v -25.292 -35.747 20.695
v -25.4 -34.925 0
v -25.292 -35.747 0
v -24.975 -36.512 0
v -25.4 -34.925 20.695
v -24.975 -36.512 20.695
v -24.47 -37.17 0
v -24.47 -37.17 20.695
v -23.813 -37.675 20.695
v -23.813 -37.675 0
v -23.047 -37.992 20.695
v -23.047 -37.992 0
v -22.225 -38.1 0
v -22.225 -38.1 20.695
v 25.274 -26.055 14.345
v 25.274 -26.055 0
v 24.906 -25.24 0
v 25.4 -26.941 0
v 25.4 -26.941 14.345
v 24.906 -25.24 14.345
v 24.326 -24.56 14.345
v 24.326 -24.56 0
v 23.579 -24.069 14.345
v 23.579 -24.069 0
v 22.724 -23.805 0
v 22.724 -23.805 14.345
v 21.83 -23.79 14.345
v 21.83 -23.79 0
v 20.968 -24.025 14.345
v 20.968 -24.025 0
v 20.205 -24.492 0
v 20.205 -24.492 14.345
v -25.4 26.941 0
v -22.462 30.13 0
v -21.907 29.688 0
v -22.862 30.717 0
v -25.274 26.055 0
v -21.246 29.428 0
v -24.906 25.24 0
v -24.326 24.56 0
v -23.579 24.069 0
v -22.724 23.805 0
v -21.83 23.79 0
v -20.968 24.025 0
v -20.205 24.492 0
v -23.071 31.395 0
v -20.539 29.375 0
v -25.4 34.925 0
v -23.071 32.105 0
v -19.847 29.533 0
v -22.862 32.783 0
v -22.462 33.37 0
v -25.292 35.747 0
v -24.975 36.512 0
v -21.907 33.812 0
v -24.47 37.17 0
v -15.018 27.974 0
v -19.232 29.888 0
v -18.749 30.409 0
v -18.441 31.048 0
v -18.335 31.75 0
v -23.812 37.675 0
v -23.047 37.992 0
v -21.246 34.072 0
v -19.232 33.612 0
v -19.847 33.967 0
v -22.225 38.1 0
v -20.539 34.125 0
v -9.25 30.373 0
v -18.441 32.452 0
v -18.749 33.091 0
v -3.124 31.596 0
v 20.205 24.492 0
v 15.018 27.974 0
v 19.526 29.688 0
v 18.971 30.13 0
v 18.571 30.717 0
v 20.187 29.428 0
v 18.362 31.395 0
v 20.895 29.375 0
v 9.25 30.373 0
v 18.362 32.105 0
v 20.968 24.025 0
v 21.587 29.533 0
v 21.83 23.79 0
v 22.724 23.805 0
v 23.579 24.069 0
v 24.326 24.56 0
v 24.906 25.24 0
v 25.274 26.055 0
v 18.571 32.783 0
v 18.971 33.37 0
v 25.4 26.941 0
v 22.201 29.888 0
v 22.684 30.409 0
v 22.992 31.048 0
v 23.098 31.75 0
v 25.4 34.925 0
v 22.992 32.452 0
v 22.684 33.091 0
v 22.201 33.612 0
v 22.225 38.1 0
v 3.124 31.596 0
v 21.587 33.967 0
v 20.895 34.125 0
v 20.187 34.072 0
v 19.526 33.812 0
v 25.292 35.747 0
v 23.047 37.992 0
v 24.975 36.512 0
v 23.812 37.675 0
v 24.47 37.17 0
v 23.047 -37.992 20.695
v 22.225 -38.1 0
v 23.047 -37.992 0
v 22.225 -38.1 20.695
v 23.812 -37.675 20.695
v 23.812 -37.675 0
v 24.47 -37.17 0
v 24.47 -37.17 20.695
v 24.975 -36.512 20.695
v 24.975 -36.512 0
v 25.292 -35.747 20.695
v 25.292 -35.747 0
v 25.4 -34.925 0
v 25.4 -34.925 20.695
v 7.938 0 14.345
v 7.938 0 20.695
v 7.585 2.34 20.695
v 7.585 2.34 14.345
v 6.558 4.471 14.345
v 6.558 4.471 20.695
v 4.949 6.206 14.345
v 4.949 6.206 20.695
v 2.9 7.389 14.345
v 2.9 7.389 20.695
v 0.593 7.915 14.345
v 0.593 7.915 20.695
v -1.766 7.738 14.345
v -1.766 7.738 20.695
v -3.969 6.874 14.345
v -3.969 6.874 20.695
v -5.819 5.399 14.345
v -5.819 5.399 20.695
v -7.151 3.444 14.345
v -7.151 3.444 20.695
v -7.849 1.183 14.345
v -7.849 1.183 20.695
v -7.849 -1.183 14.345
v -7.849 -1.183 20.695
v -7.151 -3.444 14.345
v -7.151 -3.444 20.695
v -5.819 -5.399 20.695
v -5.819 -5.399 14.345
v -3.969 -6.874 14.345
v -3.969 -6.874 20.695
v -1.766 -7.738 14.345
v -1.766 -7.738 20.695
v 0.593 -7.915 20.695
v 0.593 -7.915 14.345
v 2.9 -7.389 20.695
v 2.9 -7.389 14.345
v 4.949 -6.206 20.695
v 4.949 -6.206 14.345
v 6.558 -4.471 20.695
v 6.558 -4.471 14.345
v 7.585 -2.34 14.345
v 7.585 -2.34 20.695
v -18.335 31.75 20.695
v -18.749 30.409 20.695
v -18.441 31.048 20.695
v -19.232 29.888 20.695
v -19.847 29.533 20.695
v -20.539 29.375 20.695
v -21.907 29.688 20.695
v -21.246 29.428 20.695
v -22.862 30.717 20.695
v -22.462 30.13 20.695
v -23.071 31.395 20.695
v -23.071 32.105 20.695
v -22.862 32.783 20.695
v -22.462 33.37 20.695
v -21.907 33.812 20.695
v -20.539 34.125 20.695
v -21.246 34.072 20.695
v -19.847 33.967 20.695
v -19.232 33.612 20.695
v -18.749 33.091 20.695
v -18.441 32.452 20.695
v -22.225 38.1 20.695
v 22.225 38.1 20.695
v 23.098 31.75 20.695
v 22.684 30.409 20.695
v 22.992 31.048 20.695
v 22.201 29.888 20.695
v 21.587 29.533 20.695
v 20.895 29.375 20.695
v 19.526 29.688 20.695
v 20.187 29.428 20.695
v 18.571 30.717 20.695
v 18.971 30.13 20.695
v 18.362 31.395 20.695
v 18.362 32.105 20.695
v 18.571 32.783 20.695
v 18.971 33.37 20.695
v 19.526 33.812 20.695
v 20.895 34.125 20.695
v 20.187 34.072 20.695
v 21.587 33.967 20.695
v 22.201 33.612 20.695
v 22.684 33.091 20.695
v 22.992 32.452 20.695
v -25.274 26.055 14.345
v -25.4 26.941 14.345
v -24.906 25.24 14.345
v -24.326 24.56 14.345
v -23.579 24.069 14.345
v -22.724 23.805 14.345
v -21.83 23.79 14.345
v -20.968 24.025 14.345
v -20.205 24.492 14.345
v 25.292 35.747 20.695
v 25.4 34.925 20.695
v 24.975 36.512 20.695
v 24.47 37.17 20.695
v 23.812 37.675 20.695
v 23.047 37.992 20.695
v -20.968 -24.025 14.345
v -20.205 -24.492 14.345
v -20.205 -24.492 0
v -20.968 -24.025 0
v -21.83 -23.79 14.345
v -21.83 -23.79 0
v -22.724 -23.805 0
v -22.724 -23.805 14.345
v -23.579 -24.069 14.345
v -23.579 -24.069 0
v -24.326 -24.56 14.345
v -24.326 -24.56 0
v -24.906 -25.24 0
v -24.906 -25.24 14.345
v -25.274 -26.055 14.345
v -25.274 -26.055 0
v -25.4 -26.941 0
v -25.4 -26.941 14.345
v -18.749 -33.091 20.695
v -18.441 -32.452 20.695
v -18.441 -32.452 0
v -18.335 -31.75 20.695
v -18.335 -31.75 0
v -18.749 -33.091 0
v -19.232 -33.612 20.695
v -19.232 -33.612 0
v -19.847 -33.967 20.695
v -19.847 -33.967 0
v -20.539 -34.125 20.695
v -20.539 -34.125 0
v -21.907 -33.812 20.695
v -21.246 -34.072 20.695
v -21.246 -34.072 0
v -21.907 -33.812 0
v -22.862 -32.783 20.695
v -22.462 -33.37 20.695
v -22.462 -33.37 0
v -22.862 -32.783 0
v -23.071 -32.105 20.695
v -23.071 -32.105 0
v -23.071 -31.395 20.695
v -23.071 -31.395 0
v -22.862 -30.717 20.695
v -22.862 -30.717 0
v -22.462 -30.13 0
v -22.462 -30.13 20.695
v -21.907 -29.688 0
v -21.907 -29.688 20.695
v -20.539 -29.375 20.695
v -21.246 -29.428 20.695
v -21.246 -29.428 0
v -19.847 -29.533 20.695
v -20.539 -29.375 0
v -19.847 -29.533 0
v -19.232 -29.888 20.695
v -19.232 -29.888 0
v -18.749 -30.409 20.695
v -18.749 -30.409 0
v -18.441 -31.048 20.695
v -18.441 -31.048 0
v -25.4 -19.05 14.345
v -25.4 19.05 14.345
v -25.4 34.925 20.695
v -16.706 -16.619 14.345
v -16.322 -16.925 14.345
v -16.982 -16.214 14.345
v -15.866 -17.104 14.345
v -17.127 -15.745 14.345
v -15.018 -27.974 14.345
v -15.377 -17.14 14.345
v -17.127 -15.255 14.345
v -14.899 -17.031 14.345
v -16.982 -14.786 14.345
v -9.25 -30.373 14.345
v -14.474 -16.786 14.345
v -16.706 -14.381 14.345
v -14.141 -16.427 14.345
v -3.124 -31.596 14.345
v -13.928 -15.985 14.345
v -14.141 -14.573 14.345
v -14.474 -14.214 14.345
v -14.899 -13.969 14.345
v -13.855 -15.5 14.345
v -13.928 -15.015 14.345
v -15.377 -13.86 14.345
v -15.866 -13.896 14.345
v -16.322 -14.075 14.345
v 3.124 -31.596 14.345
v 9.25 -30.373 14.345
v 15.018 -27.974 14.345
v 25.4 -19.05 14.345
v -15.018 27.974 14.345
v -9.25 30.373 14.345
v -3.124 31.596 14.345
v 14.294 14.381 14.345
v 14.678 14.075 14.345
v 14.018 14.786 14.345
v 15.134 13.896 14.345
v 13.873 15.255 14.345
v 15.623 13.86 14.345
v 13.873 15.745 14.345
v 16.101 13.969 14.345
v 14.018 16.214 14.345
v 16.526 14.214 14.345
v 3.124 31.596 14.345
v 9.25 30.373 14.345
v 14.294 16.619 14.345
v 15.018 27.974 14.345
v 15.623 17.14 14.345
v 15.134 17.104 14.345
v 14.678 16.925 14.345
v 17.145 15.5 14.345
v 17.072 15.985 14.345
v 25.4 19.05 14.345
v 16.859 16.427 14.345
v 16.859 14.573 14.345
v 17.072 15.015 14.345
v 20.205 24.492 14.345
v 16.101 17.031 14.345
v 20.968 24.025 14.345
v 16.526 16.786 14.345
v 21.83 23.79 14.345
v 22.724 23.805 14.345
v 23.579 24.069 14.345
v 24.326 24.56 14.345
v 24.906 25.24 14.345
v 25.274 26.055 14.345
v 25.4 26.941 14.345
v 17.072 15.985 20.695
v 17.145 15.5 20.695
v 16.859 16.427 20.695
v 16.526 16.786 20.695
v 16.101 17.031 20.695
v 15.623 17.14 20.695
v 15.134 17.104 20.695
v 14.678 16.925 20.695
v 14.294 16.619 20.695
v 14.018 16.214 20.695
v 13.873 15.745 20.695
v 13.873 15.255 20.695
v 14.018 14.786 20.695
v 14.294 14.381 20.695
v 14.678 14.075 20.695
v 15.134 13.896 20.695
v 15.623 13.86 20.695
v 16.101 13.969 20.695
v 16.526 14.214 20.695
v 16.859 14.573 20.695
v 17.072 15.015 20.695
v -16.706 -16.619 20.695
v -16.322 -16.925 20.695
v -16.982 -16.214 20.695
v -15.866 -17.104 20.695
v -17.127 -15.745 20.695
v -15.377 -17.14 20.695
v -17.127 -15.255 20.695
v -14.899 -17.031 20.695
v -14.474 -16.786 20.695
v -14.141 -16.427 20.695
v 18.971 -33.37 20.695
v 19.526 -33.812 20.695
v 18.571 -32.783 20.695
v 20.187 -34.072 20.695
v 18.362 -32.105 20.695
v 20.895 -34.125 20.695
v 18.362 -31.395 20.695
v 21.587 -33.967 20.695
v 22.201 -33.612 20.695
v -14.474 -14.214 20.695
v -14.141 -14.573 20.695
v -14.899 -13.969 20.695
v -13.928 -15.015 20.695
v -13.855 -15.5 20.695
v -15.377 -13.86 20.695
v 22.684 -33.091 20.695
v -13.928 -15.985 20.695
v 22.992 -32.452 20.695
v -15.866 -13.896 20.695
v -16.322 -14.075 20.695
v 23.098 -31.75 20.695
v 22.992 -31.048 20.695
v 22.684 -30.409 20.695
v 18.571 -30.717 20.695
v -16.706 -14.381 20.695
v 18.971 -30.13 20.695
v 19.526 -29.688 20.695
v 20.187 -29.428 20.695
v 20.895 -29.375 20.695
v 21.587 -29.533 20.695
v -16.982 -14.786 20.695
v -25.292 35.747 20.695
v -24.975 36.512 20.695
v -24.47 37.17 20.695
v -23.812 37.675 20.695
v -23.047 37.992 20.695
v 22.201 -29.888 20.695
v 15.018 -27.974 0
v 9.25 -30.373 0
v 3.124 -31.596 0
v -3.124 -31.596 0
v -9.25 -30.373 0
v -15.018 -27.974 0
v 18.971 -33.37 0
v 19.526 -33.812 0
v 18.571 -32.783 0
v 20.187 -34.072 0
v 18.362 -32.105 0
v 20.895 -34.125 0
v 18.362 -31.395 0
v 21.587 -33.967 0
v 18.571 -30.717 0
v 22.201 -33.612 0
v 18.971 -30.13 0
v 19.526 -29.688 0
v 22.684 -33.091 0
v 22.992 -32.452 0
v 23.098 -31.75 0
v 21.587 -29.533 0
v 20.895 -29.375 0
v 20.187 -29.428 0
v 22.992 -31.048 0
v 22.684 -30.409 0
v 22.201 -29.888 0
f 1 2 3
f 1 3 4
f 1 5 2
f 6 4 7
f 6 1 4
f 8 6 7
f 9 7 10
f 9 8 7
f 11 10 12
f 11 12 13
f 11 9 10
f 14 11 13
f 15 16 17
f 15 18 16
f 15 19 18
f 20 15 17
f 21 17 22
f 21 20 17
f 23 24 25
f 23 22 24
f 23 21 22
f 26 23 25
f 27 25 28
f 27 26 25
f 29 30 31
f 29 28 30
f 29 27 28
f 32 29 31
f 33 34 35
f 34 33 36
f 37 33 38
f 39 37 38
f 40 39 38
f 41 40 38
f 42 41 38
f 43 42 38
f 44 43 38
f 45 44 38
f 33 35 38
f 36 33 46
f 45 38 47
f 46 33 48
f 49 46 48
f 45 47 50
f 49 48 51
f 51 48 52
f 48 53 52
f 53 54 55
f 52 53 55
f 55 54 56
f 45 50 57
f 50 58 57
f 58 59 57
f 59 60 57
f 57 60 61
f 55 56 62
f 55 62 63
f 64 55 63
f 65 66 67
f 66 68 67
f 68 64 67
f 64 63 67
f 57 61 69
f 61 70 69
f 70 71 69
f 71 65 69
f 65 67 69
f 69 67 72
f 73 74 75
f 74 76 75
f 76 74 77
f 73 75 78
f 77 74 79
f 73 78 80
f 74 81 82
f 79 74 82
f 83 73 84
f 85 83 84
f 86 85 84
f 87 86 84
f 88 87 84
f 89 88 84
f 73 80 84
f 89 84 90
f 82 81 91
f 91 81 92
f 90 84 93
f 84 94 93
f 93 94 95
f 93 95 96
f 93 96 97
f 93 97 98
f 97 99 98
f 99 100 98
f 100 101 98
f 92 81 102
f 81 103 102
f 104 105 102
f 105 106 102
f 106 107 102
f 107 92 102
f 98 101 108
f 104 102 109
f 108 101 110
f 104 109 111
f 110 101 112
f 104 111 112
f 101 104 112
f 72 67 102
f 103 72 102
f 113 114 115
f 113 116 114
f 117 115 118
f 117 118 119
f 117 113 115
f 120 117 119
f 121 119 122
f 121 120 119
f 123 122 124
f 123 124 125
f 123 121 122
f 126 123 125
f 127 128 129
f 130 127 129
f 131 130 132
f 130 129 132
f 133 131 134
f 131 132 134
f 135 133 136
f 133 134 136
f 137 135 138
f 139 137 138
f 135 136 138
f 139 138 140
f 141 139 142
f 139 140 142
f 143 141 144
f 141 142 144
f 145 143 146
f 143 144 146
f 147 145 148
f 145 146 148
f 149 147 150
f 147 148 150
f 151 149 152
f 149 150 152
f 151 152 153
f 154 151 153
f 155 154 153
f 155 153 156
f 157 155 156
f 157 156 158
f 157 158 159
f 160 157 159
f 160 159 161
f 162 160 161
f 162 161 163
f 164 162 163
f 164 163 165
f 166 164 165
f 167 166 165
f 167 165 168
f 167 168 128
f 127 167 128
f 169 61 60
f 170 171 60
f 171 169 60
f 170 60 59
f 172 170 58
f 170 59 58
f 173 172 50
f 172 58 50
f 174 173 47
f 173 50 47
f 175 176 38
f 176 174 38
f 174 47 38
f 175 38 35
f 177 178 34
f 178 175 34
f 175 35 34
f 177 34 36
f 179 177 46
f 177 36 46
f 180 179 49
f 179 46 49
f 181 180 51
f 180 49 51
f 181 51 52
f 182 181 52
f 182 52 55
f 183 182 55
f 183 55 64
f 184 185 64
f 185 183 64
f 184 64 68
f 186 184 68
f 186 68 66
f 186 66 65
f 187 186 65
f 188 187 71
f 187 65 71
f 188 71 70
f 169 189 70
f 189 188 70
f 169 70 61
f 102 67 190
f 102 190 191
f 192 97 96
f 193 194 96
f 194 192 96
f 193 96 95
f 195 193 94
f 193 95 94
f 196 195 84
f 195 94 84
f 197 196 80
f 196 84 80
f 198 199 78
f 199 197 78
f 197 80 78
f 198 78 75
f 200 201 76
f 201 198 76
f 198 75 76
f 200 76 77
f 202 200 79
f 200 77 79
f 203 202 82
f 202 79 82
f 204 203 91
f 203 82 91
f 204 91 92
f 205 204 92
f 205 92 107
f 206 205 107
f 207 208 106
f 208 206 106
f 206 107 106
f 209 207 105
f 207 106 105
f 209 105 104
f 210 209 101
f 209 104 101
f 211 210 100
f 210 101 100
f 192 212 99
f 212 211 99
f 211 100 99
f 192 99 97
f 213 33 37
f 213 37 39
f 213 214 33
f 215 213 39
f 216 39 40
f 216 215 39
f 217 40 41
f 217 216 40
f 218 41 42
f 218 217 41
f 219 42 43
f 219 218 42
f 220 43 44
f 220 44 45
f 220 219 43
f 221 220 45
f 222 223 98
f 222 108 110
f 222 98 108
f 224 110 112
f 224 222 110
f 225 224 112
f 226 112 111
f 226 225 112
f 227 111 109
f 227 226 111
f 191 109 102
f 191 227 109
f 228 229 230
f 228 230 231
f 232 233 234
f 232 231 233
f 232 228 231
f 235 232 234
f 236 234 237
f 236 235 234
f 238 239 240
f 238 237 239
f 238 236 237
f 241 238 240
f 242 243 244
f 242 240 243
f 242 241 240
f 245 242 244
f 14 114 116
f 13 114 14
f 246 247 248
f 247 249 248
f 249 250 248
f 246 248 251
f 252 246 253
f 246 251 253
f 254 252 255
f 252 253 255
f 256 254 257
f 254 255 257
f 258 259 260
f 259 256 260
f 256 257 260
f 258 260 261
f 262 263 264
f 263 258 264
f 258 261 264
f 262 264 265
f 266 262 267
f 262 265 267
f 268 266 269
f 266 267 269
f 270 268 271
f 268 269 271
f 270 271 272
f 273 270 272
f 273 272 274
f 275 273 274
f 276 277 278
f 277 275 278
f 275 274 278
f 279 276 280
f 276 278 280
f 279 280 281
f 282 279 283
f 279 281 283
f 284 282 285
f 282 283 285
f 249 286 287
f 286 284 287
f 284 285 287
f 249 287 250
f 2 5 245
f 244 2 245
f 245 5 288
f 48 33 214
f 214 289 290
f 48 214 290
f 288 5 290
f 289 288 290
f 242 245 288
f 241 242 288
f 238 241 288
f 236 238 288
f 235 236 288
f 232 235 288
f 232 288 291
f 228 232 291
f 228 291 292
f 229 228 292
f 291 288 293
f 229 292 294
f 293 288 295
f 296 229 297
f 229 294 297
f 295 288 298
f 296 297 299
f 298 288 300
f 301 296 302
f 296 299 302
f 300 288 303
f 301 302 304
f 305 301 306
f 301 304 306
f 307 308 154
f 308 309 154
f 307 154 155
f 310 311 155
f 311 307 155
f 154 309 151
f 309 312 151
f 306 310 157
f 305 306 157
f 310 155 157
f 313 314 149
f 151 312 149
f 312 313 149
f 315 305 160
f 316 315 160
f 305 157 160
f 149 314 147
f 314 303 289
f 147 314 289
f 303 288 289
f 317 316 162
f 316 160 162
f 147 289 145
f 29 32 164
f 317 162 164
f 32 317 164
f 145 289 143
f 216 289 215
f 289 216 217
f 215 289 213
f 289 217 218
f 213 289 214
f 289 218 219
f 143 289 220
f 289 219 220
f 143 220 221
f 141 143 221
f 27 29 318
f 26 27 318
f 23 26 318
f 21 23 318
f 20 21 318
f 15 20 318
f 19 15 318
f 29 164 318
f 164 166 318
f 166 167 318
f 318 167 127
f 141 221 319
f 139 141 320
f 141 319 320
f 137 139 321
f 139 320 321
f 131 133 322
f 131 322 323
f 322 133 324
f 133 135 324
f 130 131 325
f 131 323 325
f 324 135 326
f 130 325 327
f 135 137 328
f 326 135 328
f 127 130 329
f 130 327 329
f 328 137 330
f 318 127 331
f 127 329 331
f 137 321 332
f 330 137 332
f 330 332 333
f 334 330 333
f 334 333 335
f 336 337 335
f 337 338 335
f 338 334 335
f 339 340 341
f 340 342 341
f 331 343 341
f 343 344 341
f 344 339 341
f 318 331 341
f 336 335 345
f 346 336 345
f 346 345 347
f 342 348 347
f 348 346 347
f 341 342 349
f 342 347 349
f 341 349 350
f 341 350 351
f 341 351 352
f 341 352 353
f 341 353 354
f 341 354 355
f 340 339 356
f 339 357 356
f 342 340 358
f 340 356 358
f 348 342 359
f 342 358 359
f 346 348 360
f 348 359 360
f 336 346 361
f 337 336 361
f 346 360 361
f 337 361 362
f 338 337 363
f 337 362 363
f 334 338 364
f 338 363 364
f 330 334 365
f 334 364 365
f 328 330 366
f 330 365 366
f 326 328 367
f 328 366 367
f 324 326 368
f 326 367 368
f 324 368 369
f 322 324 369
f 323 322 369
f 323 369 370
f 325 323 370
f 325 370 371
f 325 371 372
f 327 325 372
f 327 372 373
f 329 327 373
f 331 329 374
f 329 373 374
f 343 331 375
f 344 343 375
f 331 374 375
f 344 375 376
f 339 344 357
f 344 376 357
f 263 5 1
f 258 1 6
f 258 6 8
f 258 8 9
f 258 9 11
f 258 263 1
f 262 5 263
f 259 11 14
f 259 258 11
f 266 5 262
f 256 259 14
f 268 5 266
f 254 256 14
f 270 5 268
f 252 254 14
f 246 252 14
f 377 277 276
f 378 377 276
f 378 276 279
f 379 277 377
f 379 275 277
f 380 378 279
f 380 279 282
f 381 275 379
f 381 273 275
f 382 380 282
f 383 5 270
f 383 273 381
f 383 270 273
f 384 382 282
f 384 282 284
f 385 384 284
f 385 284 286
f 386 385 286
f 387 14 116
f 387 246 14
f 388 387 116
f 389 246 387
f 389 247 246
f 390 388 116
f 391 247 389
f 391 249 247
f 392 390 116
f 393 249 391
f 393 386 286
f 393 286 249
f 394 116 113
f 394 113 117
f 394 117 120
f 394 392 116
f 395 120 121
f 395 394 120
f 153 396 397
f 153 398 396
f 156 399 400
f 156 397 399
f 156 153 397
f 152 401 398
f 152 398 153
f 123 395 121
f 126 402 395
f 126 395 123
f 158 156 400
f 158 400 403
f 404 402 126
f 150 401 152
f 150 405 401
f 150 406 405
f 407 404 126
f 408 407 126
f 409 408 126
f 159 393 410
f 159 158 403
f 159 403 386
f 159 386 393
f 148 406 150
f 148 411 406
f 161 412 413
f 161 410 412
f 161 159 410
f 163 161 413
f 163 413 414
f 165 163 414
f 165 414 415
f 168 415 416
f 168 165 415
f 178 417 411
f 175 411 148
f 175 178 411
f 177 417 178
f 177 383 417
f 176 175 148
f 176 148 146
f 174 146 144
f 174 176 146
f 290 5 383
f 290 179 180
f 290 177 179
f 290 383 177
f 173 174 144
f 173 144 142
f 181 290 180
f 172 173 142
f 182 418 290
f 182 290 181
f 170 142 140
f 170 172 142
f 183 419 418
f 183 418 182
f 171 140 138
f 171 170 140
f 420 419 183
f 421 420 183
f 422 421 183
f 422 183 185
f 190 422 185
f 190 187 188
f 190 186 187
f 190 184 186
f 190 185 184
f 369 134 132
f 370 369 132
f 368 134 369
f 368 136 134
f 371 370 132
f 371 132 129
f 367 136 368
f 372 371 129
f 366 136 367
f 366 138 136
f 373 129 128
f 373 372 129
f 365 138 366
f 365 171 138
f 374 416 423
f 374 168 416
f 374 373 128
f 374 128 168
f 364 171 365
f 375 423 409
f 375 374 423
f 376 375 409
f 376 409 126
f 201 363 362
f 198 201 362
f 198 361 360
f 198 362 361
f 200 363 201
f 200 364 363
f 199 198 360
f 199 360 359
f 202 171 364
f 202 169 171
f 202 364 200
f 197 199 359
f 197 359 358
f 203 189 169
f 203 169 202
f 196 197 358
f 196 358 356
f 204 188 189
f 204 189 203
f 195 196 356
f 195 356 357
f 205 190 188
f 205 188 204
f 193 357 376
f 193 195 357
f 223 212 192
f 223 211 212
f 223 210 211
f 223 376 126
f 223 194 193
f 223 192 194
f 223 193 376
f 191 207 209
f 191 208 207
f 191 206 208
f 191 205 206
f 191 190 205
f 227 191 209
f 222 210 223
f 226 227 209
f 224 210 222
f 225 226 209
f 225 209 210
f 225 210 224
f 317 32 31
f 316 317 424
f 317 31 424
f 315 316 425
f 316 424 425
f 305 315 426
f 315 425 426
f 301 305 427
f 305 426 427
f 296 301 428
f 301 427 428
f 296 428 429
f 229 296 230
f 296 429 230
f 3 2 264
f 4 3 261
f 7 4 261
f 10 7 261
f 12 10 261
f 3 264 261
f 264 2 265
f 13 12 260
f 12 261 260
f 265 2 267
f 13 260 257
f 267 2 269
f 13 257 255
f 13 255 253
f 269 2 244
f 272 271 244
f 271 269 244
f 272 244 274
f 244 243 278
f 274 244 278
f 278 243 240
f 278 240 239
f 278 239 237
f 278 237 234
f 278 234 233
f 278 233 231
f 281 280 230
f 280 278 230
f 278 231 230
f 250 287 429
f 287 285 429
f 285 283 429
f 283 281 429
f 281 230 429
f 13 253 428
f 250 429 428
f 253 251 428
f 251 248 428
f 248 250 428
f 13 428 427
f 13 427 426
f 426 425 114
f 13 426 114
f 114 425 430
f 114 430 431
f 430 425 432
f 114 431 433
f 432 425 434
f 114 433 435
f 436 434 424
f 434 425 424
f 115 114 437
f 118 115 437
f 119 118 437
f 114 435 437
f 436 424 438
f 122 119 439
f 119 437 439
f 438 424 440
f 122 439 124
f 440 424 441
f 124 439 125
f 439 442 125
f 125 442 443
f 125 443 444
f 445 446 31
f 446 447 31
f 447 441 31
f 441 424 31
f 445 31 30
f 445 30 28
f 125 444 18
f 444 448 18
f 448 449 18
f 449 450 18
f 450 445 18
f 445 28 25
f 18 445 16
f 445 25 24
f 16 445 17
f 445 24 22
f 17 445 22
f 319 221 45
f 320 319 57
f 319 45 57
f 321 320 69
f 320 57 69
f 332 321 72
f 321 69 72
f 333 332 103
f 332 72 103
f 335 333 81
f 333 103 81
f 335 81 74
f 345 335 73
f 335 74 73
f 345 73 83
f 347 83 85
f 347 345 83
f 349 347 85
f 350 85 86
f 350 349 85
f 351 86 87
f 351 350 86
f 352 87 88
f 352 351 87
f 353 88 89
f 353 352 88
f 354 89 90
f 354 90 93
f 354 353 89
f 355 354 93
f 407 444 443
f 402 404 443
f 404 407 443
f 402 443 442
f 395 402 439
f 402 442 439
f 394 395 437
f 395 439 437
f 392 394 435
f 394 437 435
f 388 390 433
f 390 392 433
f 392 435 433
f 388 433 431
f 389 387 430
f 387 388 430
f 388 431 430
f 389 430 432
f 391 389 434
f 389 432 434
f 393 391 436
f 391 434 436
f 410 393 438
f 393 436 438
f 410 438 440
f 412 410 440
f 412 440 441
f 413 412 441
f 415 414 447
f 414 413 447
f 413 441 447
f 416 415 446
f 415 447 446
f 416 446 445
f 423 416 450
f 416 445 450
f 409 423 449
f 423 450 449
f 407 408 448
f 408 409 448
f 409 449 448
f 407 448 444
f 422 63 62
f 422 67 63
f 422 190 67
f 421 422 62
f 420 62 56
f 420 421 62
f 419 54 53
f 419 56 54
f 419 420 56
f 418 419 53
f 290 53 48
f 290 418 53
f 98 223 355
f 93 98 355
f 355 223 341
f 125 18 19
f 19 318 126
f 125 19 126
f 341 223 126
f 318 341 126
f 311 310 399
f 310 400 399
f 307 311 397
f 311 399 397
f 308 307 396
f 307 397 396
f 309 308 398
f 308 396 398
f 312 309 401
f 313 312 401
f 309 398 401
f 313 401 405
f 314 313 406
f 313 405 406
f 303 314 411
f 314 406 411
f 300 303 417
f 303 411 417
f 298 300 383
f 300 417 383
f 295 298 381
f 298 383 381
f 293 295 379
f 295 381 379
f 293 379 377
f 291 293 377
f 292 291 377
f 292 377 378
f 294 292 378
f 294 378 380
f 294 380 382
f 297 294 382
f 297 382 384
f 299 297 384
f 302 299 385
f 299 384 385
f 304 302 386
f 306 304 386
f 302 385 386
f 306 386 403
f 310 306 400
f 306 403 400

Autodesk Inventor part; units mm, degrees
ref_plane "YZ Plane" through (0, 0, 0) normal (1, 0, 0) x (0, 1, 0)
ref_plane "XZ Plane" through (0, 0, 0) normal (0, 1, 0) x (-1, 0, 0)
sketch "Sketch1" plane through (0, 0, 0) normal (0, 0, 1) x (1, 0, 0)
  circle A0 centre (0, 0) radius 31.75 projected
  line L0 (25.4, 38.1) -> (25.4, -38.1) projected
  circle A1 centre (20.7166, 31.75) radius 2.3813 projected
  line L1 (14.986, 531.4221) -> (14.986, -382.9779) projected
  line L2 (-25.4, 38.1) -> (25.4, 38.1) projected
  circle A2 centre (-20.7166, 31.75) radius 2.3813 projected
  line L3 (-25.4, -38.1) -> (-25.4, 38.1) projected
  circle A3 centre (-20.7166, -31.75) radius 2.3813 projected
  line L4 (25.4, -38.1) -> (-25.4, -38.1) projected
  circle A4 centre (20.7166, -31.75) radius 2.3813 projected
  circle A5 centre (0, 0) radius 31.75 projected
  point P0 (0, 0)
  point P1 (25.4, -19.05)
  point P2 (-25.4, -19.05)
  point P3 (-25.4, 19.05)
  point P4 (25.4, 19.05)
ref_plane "Work Plane1" through (-19.4127, -19.4127, 20.695) normal (0, 0, -1) x (0, 1, 0)
extrude "Extrusion1" add sketch "Sketch1" along normal up to surface (20.695 mm away) contours A0 L1 L2 L0 | L0 L4 L1 A0 | A0 L3 L2 L1 | L1 L4 L3 A0
sketch "Sketch2" plane through (0, 0, 20.695) normal (0, 0, 1) x (1, 0, 0)
  arc A0 (-25.4, -19.05) -> (25.4, -19.05) centre (0, 0) ccw projected
  line L0 (25.4, 38.1) -> (25.4, -38.1) projected
  arc A1 (25.4, 19.05) -> (-25.4, 19.05) centre (0, 0) ccw projected
  line L1 (-25.4, -38.1) -> (-25.4, 38.1) projected
  circle A2 centre (-15.5, -15.5) radius 1.6449 projected
  circle A3 centre (15.5, 15.5) radius 1.6449 projected
  circle A4 centre (0, 0) radius 7.9375
  point P0 (0, 0)
  dimension "d2" = 15.875
extrude "Extrusion2" add sketch "Sketch2" against normal blind 6.35
fillet "Fillet1" radius 3.175 8 edges at (-25.4, -19.05, 7.1725) (-25.4, 19.05, 7.1725) (-25.4, 38.1, 10.3475) (25.4, 38.1, 10.3475) (25.4, -38.1, 10.3475) (-25.4, -38.1, 10.3475) (25.4, 19.05, 7.1725) (25.4, -19.05, 7.1725)
properties part number "Printed Encoder Mount"
